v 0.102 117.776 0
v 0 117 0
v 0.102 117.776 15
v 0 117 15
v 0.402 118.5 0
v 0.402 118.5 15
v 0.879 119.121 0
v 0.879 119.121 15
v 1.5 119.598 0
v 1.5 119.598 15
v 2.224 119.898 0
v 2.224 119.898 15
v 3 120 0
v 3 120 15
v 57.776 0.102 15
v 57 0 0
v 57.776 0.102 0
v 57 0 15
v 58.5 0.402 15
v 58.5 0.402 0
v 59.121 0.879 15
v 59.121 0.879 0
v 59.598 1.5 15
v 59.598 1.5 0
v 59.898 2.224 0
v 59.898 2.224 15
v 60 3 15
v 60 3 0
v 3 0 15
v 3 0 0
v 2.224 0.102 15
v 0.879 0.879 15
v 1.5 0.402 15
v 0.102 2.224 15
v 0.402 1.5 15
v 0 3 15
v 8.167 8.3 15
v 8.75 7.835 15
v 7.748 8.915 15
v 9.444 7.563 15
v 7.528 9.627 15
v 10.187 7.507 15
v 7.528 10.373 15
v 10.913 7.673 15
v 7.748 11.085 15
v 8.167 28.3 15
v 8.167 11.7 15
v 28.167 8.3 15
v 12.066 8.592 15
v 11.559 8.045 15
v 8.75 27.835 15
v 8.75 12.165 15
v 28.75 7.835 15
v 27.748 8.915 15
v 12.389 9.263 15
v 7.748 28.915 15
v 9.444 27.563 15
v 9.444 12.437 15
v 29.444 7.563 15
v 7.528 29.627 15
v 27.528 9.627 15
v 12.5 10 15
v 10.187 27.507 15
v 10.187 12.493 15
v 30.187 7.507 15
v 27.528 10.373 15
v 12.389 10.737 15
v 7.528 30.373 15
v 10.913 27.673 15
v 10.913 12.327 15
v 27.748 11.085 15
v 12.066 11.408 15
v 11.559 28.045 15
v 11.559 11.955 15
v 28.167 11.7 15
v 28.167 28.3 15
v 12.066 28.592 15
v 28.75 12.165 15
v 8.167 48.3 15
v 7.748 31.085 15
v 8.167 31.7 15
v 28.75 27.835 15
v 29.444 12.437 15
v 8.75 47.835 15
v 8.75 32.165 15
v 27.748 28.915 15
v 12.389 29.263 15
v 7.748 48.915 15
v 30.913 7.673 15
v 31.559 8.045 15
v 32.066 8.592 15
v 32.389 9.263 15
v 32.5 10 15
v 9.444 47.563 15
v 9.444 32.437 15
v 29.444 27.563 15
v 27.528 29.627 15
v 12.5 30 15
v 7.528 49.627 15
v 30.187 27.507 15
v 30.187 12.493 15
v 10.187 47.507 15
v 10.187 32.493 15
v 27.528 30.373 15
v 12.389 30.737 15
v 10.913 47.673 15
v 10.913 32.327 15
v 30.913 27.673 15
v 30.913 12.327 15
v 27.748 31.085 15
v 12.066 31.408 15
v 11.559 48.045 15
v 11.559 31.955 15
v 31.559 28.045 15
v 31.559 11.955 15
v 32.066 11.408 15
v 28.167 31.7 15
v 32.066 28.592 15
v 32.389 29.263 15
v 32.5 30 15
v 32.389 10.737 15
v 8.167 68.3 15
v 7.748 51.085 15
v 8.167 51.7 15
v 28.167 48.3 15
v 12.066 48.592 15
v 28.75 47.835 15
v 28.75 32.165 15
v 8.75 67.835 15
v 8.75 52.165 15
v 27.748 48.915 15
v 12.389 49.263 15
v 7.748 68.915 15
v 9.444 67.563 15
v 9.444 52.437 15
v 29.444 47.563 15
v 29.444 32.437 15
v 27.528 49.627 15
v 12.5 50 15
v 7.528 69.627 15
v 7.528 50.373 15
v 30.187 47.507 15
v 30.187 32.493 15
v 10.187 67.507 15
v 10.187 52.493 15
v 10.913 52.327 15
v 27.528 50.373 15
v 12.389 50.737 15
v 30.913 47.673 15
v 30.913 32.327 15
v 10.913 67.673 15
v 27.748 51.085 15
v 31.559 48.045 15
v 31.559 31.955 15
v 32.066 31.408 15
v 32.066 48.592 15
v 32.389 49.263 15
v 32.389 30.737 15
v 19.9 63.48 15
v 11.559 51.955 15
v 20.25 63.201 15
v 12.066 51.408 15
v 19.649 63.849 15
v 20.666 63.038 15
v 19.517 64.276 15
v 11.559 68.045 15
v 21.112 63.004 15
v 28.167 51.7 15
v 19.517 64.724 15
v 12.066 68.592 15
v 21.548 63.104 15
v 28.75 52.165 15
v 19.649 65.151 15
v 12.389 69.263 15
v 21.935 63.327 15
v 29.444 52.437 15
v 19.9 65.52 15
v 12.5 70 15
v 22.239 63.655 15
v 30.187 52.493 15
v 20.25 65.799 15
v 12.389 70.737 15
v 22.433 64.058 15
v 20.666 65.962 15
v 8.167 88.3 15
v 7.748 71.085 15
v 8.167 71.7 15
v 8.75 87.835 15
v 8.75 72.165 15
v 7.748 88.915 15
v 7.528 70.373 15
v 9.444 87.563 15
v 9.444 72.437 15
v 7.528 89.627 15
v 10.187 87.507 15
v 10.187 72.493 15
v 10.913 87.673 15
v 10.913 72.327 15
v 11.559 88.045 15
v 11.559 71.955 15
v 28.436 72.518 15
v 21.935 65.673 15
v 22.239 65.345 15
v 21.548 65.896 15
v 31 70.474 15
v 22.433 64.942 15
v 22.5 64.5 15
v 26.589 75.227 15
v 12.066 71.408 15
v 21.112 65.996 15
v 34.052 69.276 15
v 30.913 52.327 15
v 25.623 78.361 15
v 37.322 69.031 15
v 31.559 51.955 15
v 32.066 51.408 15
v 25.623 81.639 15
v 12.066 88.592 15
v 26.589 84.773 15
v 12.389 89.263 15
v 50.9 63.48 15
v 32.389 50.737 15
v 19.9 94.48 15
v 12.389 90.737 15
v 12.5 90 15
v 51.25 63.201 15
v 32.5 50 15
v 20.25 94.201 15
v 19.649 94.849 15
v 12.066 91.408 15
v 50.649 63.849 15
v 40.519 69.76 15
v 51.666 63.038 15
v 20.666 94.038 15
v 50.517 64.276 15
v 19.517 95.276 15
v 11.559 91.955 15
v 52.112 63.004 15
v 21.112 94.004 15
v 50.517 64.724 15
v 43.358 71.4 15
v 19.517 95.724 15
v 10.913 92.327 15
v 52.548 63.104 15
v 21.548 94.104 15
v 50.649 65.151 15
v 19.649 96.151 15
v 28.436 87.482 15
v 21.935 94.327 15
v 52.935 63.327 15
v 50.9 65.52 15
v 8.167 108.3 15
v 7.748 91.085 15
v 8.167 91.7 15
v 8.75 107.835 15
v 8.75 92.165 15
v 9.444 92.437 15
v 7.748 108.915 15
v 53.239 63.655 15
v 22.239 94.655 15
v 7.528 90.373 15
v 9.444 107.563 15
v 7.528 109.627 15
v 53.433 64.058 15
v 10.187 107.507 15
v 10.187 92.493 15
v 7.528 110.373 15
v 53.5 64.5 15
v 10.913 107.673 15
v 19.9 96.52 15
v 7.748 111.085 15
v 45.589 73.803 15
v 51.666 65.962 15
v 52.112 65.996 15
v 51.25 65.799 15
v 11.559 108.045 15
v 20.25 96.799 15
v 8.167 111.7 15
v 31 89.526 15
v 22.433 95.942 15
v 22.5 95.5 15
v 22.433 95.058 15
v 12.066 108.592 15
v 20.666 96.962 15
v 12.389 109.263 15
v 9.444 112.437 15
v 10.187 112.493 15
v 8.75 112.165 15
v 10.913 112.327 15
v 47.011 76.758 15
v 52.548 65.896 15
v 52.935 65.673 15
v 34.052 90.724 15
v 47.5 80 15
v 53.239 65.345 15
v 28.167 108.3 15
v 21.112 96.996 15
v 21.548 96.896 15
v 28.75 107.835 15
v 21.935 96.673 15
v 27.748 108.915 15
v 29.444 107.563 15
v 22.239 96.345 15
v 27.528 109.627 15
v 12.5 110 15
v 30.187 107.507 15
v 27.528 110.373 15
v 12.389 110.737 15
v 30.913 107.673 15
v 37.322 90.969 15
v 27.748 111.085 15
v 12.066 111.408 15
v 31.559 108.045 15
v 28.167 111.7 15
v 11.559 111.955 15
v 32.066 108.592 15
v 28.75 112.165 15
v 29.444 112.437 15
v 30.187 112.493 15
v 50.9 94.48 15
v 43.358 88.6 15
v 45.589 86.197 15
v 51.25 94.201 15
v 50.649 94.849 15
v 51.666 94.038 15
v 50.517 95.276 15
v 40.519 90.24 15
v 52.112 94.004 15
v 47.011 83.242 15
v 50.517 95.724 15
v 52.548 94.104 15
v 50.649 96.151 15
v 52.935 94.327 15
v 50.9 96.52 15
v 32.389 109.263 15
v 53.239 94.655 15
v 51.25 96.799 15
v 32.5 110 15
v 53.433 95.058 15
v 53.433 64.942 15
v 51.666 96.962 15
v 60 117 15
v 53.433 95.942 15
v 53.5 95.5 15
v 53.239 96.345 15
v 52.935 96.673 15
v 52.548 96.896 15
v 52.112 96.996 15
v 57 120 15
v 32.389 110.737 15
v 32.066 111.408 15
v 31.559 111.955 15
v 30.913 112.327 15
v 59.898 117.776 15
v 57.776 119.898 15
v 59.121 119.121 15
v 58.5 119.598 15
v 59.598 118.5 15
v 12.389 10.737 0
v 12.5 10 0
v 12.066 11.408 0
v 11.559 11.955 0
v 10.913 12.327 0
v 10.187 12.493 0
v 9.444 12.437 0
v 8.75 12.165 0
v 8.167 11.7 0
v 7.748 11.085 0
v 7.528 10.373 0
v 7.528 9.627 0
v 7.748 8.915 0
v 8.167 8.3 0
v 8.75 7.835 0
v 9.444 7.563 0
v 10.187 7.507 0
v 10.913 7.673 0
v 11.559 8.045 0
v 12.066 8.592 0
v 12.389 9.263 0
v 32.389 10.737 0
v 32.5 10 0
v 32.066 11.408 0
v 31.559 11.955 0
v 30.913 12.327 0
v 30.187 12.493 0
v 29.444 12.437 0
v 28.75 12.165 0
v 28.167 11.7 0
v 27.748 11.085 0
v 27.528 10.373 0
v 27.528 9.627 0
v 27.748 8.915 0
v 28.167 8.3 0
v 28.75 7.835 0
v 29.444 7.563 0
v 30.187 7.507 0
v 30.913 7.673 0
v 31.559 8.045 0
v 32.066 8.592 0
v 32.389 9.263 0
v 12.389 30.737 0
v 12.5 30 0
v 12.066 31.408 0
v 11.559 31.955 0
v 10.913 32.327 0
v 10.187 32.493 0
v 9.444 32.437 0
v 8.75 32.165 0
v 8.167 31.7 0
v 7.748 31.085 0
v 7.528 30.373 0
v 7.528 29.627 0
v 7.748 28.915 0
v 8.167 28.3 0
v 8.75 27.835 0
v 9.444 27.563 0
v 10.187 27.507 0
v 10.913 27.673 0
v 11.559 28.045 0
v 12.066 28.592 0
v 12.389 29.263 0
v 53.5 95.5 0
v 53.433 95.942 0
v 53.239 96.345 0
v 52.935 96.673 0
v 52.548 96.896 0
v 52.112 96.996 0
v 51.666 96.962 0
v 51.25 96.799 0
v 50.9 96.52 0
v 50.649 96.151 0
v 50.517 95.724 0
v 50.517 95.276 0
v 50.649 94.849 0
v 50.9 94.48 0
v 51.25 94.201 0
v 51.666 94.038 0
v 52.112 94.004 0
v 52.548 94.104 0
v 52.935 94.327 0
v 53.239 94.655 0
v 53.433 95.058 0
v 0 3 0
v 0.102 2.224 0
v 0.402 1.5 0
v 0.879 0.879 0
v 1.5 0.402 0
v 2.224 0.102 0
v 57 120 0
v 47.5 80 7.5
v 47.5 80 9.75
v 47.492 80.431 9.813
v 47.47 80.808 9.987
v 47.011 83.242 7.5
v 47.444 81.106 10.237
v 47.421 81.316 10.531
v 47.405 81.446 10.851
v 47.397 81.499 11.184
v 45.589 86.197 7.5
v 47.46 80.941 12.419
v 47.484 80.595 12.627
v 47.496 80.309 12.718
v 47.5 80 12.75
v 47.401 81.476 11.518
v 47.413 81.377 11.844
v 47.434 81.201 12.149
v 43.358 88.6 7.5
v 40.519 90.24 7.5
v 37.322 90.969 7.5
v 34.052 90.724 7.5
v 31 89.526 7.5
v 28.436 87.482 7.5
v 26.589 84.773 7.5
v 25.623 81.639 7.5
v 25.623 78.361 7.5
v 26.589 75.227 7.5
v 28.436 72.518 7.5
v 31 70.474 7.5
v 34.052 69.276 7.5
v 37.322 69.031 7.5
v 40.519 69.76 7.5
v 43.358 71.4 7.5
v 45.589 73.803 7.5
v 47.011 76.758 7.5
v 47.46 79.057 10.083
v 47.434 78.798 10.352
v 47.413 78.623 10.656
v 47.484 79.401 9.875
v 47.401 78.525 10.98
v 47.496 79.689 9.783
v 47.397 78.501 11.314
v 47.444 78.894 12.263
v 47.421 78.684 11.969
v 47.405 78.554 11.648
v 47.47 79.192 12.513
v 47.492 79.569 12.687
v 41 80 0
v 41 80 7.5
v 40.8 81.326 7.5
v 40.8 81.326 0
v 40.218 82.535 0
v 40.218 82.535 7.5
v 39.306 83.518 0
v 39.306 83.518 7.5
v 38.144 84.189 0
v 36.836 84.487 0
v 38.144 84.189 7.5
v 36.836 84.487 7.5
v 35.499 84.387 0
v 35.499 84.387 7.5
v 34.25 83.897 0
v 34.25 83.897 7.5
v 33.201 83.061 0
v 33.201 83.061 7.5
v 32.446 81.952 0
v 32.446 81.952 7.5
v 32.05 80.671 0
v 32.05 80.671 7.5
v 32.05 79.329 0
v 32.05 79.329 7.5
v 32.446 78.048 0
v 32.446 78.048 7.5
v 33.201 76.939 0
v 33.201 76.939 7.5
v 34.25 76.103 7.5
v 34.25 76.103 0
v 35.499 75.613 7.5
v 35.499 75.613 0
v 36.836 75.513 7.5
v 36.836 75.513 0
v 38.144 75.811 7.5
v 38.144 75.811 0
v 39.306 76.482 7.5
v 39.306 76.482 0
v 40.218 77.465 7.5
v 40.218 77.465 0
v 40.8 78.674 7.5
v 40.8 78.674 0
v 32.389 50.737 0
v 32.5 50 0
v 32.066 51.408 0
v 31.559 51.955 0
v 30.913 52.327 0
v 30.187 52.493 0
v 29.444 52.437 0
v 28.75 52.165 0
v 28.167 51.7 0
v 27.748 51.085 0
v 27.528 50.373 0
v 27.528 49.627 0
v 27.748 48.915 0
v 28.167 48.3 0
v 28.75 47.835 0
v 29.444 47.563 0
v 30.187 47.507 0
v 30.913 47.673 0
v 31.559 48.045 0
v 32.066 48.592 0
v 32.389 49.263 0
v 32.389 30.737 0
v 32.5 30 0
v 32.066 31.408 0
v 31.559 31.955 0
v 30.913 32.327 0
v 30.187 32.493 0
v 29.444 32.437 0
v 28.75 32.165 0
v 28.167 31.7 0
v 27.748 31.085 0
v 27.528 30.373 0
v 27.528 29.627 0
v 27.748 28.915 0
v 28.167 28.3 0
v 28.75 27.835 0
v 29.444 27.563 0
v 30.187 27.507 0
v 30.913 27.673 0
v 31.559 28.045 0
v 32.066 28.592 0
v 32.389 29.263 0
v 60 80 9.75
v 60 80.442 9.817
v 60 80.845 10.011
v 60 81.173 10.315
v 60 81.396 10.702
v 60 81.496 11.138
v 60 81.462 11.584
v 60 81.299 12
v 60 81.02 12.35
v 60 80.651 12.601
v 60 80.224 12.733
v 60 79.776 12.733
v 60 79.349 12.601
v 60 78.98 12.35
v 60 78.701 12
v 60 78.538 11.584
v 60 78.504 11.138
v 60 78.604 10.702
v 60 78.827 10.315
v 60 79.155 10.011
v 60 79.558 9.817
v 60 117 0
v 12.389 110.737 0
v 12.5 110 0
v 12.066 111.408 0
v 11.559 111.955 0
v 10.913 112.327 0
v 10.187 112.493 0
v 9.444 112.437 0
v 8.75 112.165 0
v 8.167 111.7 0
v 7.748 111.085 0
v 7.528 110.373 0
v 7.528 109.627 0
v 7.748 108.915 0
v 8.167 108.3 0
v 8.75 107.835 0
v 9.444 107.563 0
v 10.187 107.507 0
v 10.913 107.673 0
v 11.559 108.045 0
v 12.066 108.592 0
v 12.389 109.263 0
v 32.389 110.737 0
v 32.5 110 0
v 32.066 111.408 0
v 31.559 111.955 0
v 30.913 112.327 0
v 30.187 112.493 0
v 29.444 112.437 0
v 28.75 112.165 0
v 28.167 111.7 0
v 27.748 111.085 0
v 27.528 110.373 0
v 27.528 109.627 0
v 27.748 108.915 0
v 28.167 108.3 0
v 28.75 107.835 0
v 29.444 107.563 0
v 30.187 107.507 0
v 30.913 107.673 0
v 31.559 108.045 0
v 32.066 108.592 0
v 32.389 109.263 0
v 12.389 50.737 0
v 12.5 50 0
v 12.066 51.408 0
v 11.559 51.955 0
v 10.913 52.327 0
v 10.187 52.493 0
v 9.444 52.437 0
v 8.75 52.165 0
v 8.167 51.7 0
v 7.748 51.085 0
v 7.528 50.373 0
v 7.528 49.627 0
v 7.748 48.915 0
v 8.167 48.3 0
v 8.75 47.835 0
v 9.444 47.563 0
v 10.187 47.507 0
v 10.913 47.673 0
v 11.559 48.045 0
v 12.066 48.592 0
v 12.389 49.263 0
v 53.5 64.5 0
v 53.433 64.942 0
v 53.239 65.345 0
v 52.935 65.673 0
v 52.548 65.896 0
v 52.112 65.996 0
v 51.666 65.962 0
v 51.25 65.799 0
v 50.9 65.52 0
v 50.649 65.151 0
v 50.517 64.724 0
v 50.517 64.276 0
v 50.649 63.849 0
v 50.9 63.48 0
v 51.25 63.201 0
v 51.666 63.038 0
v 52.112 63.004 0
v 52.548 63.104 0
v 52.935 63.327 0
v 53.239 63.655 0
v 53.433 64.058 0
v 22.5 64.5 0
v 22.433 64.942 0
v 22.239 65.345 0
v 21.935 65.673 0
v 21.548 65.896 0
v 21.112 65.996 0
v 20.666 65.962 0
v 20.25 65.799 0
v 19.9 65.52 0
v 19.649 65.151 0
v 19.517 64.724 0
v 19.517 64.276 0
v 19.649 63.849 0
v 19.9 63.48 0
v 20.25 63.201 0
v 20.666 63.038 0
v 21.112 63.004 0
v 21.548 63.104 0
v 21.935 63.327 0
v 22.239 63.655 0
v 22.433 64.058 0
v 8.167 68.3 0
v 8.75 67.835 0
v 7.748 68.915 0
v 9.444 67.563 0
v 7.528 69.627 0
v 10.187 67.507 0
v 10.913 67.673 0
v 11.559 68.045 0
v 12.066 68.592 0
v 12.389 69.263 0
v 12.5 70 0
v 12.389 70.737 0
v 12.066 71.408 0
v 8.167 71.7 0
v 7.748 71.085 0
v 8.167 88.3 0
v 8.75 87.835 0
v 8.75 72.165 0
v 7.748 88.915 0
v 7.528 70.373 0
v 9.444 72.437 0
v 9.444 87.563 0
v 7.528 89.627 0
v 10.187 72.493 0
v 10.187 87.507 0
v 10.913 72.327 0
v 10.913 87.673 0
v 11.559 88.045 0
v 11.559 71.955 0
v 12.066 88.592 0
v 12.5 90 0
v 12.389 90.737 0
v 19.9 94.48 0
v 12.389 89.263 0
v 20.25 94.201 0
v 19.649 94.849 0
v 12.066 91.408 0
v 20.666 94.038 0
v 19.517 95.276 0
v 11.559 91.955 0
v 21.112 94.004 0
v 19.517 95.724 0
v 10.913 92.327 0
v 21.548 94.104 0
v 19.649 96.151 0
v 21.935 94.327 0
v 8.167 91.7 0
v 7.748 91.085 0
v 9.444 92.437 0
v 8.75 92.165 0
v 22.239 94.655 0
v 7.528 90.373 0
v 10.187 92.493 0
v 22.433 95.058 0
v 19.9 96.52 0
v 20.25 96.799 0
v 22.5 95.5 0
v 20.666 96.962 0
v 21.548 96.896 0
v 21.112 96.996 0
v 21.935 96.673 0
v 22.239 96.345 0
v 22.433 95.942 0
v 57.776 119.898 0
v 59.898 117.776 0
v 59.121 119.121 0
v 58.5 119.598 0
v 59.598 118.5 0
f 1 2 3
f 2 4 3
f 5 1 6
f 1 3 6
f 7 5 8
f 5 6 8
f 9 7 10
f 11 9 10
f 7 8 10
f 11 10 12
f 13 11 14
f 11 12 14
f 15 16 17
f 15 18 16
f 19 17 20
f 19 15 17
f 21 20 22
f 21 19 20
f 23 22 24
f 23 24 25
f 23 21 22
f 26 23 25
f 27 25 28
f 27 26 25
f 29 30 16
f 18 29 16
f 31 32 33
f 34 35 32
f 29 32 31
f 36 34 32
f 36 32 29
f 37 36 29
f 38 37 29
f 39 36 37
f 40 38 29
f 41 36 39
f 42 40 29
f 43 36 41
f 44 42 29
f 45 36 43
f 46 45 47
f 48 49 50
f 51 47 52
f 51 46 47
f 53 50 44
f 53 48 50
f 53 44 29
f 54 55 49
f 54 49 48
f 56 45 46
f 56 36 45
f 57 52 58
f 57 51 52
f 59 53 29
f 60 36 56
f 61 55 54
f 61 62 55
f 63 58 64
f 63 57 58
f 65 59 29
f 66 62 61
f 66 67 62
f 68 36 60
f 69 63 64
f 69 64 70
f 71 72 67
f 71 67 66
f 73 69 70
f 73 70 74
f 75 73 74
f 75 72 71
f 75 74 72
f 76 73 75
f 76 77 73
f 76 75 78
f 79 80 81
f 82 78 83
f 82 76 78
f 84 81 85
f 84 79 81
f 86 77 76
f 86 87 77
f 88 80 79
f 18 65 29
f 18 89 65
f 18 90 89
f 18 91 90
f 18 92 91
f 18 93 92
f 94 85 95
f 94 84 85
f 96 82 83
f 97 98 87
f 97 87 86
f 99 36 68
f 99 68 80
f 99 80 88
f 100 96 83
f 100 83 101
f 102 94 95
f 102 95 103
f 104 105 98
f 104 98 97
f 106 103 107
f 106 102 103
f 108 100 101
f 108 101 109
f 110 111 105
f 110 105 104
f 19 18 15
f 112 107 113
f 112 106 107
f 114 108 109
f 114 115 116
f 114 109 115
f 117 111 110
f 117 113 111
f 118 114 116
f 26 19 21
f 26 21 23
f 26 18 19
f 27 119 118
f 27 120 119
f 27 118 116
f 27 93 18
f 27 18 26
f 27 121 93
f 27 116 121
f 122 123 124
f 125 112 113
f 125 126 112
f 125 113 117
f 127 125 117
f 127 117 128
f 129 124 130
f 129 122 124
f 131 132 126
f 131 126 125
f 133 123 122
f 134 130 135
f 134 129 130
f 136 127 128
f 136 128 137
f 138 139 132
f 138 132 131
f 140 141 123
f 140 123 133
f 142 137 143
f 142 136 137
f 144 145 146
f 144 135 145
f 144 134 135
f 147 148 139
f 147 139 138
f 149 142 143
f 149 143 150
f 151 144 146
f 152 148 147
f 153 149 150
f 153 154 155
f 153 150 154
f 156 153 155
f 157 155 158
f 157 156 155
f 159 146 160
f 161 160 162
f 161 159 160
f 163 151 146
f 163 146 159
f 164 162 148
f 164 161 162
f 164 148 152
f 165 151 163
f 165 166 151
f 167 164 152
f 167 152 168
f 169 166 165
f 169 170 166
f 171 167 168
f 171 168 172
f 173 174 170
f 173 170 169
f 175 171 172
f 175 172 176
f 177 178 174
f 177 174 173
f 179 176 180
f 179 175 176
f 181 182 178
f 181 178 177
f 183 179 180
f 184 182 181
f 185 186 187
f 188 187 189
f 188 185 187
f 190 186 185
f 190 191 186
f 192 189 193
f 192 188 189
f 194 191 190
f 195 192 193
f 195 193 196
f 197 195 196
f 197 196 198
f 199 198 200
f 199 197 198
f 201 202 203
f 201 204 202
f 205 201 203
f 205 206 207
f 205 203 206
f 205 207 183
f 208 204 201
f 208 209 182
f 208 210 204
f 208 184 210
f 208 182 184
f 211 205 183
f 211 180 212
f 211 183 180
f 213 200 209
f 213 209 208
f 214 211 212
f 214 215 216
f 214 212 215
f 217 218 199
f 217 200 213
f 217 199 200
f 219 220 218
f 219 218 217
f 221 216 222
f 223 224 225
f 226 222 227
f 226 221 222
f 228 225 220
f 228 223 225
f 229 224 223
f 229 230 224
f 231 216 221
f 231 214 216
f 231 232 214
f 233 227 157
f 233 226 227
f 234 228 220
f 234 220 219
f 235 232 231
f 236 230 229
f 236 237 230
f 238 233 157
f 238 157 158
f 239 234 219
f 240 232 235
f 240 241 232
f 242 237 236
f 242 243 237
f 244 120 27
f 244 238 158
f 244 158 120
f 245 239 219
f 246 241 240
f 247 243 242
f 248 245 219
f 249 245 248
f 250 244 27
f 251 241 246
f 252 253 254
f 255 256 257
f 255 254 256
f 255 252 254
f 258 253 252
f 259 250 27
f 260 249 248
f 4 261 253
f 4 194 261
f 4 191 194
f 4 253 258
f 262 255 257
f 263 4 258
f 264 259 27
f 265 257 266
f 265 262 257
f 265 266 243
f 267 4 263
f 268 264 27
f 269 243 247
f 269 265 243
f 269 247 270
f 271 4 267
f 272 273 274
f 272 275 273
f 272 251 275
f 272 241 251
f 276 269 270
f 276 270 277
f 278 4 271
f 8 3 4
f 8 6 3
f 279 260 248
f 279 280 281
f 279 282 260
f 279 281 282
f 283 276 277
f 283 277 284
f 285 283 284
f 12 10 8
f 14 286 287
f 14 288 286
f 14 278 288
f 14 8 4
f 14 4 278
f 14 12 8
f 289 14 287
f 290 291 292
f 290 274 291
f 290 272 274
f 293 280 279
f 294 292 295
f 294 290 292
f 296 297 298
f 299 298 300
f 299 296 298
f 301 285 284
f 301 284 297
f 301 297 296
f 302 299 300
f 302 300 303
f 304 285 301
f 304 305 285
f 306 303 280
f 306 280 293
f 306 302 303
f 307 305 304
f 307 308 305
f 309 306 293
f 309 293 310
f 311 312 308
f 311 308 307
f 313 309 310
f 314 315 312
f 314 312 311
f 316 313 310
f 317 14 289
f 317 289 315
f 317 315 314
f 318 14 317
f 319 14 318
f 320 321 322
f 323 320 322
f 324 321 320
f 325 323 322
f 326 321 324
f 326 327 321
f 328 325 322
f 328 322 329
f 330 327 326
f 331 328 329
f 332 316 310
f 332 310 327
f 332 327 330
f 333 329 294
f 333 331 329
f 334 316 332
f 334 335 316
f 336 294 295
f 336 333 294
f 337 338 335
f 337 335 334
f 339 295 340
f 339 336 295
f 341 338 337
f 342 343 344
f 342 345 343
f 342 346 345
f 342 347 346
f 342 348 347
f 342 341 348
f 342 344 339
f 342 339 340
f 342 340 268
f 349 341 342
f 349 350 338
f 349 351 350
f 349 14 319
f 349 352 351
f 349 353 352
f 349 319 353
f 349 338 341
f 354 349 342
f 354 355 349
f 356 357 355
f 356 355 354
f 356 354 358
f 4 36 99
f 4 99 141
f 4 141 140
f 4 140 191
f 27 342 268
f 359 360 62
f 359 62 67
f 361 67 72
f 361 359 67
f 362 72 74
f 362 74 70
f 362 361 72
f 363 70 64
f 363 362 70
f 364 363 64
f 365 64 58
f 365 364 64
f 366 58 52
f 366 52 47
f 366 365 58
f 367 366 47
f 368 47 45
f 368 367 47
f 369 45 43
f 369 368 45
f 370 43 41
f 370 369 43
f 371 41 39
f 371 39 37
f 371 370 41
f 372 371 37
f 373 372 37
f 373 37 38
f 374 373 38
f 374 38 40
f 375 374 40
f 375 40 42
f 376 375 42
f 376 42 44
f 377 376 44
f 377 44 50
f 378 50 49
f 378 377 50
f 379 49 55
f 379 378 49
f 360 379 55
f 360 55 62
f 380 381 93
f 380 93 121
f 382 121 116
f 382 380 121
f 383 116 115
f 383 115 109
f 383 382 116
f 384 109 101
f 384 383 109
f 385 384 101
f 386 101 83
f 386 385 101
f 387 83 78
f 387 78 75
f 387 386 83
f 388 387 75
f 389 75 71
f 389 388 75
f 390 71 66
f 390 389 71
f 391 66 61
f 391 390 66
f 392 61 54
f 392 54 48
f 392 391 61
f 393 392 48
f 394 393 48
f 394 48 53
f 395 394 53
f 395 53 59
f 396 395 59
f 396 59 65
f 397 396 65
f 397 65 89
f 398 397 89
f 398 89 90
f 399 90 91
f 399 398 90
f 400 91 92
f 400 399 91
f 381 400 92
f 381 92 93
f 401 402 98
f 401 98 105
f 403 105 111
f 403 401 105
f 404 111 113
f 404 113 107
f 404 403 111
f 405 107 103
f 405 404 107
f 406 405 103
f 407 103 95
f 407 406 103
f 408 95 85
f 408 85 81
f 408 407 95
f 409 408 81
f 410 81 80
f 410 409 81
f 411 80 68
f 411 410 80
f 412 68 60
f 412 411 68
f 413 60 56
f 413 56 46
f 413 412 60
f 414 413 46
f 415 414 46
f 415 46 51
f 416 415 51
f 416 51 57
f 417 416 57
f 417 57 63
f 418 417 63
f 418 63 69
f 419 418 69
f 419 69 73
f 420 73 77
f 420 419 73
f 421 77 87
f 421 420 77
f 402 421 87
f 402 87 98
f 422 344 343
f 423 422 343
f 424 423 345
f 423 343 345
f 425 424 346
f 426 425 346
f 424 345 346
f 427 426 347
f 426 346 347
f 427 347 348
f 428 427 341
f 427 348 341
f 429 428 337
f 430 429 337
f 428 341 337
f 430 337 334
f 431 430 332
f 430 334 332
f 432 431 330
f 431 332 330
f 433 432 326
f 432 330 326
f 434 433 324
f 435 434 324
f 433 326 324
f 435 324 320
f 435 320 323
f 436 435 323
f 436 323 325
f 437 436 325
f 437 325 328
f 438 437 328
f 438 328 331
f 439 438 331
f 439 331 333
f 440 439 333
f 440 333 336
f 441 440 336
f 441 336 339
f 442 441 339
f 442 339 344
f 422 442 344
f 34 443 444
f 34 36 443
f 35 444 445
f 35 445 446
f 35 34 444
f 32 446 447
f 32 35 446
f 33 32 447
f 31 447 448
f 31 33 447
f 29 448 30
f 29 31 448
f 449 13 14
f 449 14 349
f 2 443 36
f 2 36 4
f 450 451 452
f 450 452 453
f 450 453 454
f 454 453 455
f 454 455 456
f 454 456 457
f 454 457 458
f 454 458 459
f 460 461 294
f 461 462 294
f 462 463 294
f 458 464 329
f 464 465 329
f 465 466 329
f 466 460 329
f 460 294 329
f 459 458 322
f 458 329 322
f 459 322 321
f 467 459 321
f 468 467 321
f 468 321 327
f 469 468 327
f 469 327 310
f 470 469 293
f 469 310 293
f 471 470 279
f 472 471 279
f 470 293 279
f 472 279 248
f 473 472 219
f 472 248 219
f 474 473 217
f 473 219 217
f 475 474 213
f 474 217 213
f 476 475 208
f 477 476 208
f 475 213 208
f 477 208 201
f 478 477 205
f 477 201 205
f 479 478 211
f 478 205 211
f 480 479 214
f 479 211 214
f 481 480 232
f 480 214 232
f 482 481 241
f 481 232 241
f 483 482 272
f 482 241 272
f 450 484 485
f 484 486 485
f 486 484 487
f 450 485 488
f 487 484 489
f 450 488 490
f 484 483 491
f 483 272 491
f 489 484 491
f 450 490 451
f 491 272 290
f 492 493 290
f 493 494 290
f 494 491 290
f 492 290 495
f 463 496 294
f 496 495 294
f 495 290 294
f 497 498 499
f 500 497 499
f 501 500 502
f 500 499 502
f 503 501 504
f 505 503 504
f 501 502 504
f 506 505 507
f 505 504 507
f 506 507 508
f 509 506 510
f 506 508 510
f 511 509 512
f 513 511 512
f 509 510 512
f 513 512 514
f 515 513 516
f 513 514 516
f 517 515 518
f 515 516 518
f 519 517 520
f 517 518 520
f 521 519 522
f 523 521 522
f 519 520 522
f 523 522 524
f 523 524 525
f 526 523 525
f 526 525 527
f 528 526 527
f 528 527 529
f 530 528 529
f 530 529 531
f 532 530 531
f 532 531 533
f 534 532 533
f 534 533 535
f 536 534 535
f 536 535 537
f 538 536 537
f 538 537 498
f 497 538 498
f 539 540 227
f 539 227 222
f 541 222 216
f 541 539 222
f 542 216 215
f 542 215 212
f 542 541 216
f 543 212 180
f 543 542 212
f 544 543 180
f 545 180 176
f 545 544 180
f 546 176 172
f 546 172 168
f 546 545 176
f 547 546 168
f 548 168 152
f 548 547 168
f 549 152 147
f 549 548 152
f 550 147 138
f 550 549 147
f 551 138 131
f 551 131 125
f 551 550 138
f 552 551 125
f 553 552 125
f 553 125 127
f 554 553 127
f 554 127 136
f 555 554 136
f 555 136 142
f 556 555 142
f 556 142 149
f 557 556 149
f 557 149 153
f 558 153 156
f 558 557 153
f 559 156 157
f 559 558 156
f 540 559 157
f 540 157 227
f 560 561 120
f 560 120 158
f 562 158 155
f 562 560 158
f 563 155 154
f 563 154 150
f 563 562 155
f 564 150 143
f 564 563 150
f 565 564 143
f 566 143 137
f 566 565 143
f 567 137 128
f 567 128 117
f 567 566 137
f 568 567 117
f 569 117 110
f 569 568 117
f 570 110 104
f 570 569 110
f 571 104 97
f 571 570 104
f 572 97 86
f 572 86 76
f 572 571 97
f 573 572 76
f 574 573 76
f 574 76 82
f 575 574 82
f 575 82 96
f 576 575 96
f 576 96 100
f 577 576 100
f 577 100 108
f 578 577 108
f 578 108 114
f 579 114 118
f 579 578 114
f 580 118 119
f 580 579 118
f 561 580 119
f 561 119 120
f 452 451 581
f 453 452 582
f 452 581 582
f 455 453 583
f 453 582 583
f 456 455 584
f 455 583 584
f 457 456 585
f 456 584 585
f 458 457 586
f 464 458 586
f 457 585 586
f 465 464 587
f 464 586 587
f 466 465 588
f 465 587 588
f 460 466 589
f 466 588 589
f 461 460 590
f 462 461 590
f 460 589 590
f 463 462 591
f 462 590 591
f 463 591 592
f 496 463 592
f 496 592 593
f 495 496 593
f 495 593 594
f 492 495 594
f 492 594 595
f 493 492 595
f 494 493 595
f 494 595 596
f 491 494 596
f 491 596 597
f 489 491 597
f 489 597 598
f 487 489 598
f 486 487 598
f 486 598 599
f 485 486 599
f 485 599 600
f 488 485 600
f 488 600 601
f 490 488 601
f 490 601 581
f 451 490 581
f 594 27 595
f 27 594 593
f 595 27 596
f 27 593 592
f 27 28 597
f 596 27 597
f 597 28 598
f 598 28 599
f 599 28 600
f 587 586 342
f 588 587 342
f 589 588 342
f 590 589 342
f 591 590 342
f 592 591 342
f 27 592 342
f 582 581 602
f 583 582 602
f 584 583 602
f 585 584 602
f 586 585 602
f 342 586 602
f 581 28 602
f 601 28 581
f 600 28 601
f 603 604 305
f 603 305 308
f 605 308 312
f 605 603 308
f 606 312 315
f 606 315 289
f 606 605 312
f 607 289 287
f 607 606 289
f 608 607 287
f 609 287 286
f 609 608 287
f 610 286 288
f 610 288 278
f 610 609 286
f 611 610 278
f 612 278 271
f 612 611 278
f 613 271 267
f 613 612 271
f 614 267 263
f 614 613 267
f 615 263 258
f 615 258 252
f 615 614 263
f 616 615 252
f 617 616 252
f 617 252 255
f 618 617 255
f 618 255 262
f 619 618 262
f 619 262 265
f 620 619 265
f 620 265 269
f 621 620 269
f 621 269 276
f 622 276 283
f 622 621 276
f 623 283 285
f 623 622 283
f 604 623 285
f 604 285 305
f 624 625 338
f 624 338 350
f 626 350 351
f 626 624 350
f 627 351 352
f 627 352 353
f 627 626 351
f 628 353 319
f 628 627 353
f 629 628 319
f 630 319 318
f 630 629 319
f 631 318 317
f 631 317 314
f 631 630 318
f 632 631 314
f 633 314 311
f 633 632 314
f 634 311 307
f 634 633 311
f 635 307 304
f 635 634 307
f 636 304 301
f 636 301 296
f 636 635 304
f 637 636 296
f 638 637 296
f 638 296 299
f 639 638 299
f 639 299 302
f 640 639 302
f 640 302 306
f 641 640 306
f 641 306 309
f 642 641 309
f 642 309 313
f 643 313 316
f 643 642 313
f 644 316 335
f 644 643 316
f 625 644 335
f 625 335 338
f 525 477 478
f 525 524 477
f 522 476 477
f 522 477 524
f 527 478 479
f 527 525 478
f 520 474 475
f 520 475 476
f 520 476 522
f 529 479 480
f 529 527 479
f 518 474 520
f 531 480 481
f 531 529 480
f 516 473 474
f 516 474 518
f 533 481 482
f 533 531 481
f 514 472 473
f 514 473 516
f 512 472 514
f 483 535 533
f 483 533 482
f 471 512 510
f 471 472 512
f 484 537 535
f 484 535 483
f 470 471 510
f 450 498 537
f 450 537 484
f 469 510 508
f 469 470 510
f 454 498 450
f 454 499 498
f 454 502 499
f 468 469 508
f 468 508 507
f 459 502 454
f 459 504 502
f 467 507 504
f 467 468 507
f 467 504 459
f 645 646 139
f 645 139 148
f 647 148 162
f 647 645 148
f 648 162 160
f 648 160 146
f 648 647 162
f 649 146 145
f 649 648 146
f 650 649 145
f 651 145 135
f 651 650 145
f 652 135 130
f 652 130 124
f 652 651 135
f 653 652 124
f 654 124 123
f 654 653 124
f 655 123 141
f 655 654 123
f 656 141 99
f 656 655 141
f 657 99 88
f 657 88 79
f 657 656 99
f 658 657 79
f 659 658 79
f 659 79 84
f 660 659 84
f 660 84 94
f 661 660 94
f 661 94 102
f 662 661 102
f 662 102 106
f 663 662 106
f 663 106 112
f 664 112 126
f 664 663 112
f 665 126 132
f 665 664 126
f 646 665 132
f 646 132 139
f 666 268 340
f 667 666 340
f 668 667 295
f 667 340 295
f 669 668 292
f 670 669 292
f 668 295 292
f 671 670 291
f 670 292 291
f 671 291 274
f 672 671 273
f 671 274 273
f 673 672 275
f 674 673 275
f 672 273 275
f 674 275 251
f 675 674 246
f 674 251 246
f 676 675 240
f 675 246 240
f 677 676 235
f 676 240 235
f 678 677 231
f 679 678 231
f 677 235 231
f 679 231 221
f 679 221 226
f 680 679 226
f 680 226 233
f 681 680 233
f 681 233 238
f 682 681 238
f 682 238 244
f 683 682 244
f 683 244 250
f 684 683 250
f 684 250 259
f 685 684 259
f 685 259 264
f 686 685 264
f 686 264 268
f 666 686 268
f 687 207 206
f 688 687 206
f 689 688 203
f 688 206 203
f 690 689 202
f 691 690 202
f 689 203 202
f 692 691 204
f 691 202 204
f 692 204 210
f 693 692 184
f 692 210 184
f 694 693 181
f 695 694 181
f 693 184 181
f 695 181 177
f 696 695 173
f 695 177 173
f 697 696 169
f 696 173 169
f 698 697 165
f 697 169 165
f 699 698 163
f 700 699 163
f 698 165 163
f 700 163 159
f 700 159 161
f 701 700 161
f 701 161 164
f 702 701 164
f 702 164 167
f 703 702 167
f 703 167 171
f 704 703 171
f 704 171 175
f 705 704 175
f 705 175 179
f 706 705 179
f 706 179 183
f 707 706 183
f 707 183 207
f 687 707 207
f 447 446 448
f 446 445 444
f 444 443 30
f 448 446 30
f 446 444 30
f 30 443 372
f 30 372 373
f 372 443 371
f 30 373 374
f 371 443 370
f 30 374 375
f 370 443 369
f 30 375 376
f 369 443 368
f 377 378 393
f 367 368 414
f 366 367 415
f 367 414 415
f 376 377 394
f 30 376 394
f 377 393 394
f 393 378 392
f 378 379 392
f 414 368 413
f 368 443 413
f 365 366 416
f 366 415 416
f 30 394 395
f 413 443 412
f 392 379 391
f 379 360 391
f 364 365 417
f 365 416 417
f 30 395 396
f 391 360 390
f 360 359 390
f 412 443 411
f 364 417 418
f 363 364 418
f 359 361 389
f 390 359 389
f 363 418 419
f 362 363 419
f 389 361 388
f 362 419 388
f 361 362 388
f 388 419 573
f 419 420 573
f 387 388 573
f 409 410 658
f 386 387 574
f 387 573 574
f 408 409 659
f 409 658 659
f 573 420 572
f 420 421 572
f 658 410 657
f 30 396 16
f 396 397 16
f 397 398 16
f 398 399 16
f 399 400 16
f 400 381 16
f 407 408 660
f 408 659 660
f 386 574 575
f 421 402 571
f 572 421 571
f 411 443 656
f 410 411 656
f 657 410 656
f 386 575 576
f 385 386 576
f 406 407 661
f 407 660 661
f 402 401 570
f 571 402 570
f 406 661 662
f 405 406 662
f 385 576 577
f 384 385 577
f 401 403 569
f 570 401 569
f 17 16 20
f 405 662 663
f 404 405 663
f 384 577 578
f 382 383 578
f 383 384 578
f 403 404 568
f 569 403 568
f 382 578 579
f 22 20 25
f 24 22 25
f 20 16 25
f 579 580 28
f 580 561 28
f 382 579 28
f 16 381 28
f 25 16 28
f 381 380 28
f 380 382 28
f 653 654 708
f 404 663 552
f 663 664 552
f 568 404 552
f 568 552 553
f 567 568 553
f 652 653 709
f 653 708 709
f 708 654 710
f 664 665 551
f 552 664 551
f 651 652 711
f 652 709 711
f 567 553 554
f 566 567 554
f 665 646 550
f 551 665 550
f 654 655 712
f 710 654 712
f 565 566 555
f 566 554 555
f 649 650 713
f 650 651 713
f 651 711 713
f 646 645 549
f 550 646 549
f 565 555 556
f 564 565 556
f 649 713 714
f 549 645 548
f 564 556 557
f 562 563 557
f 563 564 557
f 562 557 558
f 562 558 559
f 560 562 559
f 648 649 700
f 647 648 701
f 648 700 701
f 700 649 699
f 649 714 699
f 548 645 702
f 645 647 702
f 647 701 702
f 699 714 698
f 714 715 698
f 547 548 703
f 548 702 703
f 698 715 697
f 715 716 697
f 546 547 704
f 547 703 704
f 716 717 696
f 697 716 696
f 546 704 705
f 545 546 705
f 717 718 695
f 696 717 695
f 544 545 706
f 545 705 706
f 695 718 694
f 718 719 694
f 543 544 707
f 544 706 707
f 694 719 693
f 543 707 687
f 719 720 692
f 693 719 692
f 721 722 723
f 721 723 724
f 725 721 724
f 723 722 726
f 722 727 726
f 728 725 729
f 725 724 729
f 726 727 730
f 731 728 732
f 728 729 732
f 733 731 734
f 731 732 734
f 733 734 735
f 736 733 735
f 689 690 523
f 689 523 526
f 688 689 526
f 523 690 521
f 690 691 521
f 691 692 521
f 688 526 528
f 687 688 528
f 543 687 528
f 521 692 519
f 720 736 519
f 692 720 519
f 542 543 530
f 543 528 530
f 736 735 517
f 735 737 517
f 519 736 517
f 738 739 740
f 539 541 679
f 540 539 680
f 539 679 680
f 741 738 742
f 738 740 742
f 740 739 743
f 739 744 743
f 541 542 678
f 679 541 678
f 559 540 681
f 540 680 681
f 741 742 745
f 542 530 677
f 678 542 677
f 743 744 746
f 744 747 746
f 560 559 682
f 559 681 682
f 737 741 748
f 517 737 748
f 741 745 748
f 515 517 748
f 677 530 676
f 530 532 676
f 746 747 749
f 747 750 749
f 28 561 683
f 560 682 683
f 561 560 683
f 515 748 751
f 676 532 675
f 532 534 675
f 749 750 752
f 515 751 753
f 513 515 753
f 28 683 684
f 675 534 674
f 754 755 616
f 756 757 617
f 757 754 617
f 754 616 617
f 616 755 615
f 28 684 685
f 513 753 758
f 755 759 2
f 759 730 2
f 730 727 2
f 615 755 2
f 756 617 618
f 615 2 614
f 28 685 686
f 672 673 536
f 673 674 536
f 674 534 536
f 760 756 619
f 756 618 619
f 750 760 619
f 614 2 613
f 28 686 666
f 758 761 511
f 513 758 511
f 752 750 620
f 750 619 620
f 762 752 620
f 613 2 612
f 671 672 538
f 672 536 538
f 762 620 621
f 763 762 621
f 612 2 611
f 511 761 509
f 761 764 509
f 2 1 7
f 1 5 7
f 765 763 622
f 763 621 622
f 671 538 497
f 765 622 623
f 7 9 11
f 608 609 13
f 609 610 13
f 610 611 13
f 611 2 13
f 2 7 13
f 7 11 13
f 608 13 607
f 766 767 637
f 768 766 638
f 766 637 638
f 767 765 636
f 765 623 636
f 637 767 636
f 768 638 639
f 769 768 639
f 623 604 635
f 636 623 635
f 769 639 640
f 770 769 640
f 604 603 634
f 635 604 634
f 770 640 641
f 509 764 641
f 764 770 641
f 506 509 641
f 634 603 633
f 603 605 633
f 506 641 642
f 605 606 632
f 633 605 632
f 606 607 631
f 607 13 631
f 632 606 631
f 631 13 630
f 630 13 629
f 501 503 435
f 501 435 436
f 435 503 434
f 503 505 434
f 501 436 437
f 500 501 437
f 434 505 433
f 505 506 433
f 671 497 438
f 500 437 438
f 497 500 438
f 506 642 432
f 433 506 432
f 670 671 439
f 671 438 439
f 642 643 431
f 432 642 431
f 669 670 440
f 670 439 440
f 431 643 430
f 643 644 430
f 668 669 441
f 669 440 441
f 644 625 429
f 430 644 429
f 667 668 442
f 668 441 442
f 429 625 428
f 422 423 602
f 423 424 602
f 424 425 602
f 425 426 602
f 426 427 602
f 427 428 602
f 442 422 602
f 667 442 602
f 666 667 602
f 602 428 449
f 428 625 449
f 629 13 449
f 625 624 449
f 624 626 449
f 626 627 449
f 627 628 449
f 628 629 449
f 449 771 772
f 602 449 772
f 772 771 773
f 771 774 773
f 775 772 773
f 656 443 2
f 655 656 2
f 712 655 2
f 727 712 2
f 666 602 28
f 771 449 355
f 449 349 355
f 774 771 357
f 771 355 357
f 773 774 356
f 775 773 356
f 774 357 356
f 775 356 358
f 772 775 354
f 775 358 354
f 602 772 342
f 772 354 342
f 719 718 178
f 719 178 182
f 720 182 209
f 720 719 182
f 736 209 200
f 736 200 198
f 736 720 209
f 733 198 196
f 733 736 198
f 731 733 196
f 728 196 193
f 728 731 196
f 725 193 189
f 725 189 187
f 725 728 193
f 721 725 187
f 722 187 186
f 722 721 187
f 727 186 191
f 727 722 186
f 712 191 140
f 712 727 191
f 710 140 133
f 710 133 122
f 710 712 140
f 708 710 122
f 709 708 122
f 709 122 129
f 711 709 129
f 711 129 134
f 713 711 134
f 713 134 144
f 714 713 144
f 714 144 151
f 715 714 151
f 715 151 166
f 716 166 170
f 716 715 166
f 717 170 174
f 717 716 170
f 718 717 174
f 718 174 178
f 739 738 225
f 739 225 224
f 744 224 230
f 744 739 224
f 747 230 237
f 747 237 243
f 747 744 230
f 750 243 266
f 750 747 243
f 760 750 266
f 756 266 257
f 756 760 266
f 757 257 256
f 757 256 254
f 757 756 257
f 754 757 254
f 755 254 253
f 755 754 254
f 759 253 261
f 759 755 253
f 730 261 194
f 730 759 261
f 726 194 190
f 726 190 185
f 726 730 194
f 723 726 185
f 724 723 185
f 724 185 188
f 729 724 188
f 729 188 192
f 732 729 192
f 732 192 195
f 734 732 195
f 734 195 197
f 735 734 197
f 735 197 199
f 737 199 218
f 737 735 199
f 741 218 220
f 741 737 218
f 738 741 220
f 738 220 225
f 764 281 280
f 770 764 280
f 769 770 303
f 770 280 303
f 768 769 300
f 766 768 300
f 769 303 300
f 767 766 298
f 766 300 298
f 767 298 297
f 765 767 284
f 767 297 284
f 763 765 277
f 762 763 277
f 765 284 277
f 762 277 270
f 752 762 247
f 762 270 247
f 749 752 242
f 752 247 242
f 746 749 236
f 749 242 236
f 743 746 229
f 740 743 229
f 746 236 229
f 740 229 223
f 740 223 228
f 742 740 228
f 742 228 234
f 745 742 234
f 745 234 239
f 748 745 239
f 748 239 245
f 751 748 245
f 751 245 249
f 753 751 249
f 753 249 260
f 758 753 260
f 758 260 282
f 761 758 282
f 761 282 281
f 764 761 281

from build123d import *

# Parameters (mm, degrees)
SKETCH1_W               = 60
SKETCH1_H               = 120
SKETCH1_R               = 2.5
BOSS_EXTRUDE1_DEPTH     = 15
FILLET1_R               = 3
SKETCH2_R               = 4.5
SKETCH2_R_2             = 1.5
CUT_EXTRUDE1_DEPTH      = 136
SKETCH2_3_R             = 11
SKETCH2_3_R_2           = 4.5
CUT_EXTRUDE2_DEPTH      = 7.5
CUT_EXTRUDE3_REACH      = 137
CUT_EXTRUDE3_END_RADIUS = 11
SKETCH3_R               = 1.5


with BuildPart() as part:
    # Sketch1 → Boss-Extrude1 (new body)
    with BuildSketch(Plane.XY):
        with Locations((30, 60)):
            Rectangle(SKETCH1_W, SKETCH1_H)
        with Locations((10, 110)):
            Circle(SKETCH1_R, mode=Mode.SUBTRACT)
        with Locations((30, 110)):
            Circle(SKETCH1_R, mode=Mode.SUBTRACT)
        with Locations((10, 90)):
            Circle(SKETCH1_R, mode=Mode.SUBTRACT)
        with Locations((10, 70)):
            Circle(SKETCH1_R, mode=Mode.SUBTRACT)
        with Locations((10, 10)):
            Circle(SKETCH1_R, mode=Mode.SUBTRACT)
        with Locations((30, 10)):
            Circle(SKETCH1_R, mode=Mode.SUBTRACT)
        with Locations((30, 50)):
            Circle(SKETCH1_R, mode=Mode.SUBTRACT)
        with Locations((10, 50)):
            Circle(SKETCH1_R, mode=Mode.SUBTRACT)
        with Locations((10, 30)):
            Circle(SKETCH1_R, mode=Mode.SUBTRACT)
        with Locations((30, 30)):
            Circle(SKETCH1_R, mode=Mode.SUBTRACT)
    extrude(amount=BOSS_EXTRUDE1_DEPTH)

    # Fillet1
    fillet1_edges = [part.edges().sort_by_distance(p)[0] for p in [
        (0, 120, 7.5),
        (60, 120, 7.5),
        (60, 0, 7.5),
        (0, 0, 7.5),
    ]]
    fillet(fillet1_edges, radius=FILLET1_R)

    # Sketch2 → Cut-Extrude1 (cut, through all)
    with BuildSketch(Plane.XY.offset(15)):
        with Locations((36.5, 80)):
            Circle(SKETCH2_R)
        with Locations((52, 95.5)):
            Circle(SKETCH2_R_2)
        with Locations((21, 95.5)):
            Circle(SKETCH2_R_2)
        with Locations((52, 64.5)):
            Circle(SKETCH2_R_2)
        with Locations((21, 64.5)):
            Circle(SKETCH2_R_2)
    extrude(amount=-CUT_EXTRUDE1_DEPTH, mode=Mode.SUBTRACT)

    # Sketch2<3> → Cut-Extrude2 (cut)
    with BuildSketch(Plane.XY.offset(15)):
        with Locations((36.5, 80)):
            Circle(SKETCH2_3_R)
        with Locations((36.5, 80)):
            Circle(SKETCH2_3_R_2, mode=Mode.SUBTRACT)
    extrude(amount=-CUT_EXTRUDE2_DEPTH, mode=Mode.SUBTRACT)

    # Cut-Extrude3: up to this cylinder (the profile starts outside it)
    cut_extrude3_end = Plane(origin=(36.5, 80, 11.25), z_dir=(0, 0, 1)) * Cylinder(CUT_EXTRUDE3_END_RADIUS, 297, mode=Mode.PRIVATE)
    # Sketch3 → Cut-Extrude3 (cut, up to the surface)
    with BuildSketch(Plane(origin=(60, 0, 0), x_dir=(0, 0, -1), z_dir=(1, 0, 0)), mode=Mode.PRIVATE) as cut_extrude3_sk1:
        with Locations((-11.25, 80)):
            Circle(SKETCH3_R)
    cut_extrude3_tool1 = extrude(cut_extrude3_sk1.sketch, amount=-CUT_EXTRUDE3_REACH, mode=Mode.PRIVATE) - cut_extrude3_end
    add(cut_extrude3_tool1.solids().sort_by_distance((60, 80, 11.25))[0], mode=Mode.SUBTRACT)


solid = part.part
